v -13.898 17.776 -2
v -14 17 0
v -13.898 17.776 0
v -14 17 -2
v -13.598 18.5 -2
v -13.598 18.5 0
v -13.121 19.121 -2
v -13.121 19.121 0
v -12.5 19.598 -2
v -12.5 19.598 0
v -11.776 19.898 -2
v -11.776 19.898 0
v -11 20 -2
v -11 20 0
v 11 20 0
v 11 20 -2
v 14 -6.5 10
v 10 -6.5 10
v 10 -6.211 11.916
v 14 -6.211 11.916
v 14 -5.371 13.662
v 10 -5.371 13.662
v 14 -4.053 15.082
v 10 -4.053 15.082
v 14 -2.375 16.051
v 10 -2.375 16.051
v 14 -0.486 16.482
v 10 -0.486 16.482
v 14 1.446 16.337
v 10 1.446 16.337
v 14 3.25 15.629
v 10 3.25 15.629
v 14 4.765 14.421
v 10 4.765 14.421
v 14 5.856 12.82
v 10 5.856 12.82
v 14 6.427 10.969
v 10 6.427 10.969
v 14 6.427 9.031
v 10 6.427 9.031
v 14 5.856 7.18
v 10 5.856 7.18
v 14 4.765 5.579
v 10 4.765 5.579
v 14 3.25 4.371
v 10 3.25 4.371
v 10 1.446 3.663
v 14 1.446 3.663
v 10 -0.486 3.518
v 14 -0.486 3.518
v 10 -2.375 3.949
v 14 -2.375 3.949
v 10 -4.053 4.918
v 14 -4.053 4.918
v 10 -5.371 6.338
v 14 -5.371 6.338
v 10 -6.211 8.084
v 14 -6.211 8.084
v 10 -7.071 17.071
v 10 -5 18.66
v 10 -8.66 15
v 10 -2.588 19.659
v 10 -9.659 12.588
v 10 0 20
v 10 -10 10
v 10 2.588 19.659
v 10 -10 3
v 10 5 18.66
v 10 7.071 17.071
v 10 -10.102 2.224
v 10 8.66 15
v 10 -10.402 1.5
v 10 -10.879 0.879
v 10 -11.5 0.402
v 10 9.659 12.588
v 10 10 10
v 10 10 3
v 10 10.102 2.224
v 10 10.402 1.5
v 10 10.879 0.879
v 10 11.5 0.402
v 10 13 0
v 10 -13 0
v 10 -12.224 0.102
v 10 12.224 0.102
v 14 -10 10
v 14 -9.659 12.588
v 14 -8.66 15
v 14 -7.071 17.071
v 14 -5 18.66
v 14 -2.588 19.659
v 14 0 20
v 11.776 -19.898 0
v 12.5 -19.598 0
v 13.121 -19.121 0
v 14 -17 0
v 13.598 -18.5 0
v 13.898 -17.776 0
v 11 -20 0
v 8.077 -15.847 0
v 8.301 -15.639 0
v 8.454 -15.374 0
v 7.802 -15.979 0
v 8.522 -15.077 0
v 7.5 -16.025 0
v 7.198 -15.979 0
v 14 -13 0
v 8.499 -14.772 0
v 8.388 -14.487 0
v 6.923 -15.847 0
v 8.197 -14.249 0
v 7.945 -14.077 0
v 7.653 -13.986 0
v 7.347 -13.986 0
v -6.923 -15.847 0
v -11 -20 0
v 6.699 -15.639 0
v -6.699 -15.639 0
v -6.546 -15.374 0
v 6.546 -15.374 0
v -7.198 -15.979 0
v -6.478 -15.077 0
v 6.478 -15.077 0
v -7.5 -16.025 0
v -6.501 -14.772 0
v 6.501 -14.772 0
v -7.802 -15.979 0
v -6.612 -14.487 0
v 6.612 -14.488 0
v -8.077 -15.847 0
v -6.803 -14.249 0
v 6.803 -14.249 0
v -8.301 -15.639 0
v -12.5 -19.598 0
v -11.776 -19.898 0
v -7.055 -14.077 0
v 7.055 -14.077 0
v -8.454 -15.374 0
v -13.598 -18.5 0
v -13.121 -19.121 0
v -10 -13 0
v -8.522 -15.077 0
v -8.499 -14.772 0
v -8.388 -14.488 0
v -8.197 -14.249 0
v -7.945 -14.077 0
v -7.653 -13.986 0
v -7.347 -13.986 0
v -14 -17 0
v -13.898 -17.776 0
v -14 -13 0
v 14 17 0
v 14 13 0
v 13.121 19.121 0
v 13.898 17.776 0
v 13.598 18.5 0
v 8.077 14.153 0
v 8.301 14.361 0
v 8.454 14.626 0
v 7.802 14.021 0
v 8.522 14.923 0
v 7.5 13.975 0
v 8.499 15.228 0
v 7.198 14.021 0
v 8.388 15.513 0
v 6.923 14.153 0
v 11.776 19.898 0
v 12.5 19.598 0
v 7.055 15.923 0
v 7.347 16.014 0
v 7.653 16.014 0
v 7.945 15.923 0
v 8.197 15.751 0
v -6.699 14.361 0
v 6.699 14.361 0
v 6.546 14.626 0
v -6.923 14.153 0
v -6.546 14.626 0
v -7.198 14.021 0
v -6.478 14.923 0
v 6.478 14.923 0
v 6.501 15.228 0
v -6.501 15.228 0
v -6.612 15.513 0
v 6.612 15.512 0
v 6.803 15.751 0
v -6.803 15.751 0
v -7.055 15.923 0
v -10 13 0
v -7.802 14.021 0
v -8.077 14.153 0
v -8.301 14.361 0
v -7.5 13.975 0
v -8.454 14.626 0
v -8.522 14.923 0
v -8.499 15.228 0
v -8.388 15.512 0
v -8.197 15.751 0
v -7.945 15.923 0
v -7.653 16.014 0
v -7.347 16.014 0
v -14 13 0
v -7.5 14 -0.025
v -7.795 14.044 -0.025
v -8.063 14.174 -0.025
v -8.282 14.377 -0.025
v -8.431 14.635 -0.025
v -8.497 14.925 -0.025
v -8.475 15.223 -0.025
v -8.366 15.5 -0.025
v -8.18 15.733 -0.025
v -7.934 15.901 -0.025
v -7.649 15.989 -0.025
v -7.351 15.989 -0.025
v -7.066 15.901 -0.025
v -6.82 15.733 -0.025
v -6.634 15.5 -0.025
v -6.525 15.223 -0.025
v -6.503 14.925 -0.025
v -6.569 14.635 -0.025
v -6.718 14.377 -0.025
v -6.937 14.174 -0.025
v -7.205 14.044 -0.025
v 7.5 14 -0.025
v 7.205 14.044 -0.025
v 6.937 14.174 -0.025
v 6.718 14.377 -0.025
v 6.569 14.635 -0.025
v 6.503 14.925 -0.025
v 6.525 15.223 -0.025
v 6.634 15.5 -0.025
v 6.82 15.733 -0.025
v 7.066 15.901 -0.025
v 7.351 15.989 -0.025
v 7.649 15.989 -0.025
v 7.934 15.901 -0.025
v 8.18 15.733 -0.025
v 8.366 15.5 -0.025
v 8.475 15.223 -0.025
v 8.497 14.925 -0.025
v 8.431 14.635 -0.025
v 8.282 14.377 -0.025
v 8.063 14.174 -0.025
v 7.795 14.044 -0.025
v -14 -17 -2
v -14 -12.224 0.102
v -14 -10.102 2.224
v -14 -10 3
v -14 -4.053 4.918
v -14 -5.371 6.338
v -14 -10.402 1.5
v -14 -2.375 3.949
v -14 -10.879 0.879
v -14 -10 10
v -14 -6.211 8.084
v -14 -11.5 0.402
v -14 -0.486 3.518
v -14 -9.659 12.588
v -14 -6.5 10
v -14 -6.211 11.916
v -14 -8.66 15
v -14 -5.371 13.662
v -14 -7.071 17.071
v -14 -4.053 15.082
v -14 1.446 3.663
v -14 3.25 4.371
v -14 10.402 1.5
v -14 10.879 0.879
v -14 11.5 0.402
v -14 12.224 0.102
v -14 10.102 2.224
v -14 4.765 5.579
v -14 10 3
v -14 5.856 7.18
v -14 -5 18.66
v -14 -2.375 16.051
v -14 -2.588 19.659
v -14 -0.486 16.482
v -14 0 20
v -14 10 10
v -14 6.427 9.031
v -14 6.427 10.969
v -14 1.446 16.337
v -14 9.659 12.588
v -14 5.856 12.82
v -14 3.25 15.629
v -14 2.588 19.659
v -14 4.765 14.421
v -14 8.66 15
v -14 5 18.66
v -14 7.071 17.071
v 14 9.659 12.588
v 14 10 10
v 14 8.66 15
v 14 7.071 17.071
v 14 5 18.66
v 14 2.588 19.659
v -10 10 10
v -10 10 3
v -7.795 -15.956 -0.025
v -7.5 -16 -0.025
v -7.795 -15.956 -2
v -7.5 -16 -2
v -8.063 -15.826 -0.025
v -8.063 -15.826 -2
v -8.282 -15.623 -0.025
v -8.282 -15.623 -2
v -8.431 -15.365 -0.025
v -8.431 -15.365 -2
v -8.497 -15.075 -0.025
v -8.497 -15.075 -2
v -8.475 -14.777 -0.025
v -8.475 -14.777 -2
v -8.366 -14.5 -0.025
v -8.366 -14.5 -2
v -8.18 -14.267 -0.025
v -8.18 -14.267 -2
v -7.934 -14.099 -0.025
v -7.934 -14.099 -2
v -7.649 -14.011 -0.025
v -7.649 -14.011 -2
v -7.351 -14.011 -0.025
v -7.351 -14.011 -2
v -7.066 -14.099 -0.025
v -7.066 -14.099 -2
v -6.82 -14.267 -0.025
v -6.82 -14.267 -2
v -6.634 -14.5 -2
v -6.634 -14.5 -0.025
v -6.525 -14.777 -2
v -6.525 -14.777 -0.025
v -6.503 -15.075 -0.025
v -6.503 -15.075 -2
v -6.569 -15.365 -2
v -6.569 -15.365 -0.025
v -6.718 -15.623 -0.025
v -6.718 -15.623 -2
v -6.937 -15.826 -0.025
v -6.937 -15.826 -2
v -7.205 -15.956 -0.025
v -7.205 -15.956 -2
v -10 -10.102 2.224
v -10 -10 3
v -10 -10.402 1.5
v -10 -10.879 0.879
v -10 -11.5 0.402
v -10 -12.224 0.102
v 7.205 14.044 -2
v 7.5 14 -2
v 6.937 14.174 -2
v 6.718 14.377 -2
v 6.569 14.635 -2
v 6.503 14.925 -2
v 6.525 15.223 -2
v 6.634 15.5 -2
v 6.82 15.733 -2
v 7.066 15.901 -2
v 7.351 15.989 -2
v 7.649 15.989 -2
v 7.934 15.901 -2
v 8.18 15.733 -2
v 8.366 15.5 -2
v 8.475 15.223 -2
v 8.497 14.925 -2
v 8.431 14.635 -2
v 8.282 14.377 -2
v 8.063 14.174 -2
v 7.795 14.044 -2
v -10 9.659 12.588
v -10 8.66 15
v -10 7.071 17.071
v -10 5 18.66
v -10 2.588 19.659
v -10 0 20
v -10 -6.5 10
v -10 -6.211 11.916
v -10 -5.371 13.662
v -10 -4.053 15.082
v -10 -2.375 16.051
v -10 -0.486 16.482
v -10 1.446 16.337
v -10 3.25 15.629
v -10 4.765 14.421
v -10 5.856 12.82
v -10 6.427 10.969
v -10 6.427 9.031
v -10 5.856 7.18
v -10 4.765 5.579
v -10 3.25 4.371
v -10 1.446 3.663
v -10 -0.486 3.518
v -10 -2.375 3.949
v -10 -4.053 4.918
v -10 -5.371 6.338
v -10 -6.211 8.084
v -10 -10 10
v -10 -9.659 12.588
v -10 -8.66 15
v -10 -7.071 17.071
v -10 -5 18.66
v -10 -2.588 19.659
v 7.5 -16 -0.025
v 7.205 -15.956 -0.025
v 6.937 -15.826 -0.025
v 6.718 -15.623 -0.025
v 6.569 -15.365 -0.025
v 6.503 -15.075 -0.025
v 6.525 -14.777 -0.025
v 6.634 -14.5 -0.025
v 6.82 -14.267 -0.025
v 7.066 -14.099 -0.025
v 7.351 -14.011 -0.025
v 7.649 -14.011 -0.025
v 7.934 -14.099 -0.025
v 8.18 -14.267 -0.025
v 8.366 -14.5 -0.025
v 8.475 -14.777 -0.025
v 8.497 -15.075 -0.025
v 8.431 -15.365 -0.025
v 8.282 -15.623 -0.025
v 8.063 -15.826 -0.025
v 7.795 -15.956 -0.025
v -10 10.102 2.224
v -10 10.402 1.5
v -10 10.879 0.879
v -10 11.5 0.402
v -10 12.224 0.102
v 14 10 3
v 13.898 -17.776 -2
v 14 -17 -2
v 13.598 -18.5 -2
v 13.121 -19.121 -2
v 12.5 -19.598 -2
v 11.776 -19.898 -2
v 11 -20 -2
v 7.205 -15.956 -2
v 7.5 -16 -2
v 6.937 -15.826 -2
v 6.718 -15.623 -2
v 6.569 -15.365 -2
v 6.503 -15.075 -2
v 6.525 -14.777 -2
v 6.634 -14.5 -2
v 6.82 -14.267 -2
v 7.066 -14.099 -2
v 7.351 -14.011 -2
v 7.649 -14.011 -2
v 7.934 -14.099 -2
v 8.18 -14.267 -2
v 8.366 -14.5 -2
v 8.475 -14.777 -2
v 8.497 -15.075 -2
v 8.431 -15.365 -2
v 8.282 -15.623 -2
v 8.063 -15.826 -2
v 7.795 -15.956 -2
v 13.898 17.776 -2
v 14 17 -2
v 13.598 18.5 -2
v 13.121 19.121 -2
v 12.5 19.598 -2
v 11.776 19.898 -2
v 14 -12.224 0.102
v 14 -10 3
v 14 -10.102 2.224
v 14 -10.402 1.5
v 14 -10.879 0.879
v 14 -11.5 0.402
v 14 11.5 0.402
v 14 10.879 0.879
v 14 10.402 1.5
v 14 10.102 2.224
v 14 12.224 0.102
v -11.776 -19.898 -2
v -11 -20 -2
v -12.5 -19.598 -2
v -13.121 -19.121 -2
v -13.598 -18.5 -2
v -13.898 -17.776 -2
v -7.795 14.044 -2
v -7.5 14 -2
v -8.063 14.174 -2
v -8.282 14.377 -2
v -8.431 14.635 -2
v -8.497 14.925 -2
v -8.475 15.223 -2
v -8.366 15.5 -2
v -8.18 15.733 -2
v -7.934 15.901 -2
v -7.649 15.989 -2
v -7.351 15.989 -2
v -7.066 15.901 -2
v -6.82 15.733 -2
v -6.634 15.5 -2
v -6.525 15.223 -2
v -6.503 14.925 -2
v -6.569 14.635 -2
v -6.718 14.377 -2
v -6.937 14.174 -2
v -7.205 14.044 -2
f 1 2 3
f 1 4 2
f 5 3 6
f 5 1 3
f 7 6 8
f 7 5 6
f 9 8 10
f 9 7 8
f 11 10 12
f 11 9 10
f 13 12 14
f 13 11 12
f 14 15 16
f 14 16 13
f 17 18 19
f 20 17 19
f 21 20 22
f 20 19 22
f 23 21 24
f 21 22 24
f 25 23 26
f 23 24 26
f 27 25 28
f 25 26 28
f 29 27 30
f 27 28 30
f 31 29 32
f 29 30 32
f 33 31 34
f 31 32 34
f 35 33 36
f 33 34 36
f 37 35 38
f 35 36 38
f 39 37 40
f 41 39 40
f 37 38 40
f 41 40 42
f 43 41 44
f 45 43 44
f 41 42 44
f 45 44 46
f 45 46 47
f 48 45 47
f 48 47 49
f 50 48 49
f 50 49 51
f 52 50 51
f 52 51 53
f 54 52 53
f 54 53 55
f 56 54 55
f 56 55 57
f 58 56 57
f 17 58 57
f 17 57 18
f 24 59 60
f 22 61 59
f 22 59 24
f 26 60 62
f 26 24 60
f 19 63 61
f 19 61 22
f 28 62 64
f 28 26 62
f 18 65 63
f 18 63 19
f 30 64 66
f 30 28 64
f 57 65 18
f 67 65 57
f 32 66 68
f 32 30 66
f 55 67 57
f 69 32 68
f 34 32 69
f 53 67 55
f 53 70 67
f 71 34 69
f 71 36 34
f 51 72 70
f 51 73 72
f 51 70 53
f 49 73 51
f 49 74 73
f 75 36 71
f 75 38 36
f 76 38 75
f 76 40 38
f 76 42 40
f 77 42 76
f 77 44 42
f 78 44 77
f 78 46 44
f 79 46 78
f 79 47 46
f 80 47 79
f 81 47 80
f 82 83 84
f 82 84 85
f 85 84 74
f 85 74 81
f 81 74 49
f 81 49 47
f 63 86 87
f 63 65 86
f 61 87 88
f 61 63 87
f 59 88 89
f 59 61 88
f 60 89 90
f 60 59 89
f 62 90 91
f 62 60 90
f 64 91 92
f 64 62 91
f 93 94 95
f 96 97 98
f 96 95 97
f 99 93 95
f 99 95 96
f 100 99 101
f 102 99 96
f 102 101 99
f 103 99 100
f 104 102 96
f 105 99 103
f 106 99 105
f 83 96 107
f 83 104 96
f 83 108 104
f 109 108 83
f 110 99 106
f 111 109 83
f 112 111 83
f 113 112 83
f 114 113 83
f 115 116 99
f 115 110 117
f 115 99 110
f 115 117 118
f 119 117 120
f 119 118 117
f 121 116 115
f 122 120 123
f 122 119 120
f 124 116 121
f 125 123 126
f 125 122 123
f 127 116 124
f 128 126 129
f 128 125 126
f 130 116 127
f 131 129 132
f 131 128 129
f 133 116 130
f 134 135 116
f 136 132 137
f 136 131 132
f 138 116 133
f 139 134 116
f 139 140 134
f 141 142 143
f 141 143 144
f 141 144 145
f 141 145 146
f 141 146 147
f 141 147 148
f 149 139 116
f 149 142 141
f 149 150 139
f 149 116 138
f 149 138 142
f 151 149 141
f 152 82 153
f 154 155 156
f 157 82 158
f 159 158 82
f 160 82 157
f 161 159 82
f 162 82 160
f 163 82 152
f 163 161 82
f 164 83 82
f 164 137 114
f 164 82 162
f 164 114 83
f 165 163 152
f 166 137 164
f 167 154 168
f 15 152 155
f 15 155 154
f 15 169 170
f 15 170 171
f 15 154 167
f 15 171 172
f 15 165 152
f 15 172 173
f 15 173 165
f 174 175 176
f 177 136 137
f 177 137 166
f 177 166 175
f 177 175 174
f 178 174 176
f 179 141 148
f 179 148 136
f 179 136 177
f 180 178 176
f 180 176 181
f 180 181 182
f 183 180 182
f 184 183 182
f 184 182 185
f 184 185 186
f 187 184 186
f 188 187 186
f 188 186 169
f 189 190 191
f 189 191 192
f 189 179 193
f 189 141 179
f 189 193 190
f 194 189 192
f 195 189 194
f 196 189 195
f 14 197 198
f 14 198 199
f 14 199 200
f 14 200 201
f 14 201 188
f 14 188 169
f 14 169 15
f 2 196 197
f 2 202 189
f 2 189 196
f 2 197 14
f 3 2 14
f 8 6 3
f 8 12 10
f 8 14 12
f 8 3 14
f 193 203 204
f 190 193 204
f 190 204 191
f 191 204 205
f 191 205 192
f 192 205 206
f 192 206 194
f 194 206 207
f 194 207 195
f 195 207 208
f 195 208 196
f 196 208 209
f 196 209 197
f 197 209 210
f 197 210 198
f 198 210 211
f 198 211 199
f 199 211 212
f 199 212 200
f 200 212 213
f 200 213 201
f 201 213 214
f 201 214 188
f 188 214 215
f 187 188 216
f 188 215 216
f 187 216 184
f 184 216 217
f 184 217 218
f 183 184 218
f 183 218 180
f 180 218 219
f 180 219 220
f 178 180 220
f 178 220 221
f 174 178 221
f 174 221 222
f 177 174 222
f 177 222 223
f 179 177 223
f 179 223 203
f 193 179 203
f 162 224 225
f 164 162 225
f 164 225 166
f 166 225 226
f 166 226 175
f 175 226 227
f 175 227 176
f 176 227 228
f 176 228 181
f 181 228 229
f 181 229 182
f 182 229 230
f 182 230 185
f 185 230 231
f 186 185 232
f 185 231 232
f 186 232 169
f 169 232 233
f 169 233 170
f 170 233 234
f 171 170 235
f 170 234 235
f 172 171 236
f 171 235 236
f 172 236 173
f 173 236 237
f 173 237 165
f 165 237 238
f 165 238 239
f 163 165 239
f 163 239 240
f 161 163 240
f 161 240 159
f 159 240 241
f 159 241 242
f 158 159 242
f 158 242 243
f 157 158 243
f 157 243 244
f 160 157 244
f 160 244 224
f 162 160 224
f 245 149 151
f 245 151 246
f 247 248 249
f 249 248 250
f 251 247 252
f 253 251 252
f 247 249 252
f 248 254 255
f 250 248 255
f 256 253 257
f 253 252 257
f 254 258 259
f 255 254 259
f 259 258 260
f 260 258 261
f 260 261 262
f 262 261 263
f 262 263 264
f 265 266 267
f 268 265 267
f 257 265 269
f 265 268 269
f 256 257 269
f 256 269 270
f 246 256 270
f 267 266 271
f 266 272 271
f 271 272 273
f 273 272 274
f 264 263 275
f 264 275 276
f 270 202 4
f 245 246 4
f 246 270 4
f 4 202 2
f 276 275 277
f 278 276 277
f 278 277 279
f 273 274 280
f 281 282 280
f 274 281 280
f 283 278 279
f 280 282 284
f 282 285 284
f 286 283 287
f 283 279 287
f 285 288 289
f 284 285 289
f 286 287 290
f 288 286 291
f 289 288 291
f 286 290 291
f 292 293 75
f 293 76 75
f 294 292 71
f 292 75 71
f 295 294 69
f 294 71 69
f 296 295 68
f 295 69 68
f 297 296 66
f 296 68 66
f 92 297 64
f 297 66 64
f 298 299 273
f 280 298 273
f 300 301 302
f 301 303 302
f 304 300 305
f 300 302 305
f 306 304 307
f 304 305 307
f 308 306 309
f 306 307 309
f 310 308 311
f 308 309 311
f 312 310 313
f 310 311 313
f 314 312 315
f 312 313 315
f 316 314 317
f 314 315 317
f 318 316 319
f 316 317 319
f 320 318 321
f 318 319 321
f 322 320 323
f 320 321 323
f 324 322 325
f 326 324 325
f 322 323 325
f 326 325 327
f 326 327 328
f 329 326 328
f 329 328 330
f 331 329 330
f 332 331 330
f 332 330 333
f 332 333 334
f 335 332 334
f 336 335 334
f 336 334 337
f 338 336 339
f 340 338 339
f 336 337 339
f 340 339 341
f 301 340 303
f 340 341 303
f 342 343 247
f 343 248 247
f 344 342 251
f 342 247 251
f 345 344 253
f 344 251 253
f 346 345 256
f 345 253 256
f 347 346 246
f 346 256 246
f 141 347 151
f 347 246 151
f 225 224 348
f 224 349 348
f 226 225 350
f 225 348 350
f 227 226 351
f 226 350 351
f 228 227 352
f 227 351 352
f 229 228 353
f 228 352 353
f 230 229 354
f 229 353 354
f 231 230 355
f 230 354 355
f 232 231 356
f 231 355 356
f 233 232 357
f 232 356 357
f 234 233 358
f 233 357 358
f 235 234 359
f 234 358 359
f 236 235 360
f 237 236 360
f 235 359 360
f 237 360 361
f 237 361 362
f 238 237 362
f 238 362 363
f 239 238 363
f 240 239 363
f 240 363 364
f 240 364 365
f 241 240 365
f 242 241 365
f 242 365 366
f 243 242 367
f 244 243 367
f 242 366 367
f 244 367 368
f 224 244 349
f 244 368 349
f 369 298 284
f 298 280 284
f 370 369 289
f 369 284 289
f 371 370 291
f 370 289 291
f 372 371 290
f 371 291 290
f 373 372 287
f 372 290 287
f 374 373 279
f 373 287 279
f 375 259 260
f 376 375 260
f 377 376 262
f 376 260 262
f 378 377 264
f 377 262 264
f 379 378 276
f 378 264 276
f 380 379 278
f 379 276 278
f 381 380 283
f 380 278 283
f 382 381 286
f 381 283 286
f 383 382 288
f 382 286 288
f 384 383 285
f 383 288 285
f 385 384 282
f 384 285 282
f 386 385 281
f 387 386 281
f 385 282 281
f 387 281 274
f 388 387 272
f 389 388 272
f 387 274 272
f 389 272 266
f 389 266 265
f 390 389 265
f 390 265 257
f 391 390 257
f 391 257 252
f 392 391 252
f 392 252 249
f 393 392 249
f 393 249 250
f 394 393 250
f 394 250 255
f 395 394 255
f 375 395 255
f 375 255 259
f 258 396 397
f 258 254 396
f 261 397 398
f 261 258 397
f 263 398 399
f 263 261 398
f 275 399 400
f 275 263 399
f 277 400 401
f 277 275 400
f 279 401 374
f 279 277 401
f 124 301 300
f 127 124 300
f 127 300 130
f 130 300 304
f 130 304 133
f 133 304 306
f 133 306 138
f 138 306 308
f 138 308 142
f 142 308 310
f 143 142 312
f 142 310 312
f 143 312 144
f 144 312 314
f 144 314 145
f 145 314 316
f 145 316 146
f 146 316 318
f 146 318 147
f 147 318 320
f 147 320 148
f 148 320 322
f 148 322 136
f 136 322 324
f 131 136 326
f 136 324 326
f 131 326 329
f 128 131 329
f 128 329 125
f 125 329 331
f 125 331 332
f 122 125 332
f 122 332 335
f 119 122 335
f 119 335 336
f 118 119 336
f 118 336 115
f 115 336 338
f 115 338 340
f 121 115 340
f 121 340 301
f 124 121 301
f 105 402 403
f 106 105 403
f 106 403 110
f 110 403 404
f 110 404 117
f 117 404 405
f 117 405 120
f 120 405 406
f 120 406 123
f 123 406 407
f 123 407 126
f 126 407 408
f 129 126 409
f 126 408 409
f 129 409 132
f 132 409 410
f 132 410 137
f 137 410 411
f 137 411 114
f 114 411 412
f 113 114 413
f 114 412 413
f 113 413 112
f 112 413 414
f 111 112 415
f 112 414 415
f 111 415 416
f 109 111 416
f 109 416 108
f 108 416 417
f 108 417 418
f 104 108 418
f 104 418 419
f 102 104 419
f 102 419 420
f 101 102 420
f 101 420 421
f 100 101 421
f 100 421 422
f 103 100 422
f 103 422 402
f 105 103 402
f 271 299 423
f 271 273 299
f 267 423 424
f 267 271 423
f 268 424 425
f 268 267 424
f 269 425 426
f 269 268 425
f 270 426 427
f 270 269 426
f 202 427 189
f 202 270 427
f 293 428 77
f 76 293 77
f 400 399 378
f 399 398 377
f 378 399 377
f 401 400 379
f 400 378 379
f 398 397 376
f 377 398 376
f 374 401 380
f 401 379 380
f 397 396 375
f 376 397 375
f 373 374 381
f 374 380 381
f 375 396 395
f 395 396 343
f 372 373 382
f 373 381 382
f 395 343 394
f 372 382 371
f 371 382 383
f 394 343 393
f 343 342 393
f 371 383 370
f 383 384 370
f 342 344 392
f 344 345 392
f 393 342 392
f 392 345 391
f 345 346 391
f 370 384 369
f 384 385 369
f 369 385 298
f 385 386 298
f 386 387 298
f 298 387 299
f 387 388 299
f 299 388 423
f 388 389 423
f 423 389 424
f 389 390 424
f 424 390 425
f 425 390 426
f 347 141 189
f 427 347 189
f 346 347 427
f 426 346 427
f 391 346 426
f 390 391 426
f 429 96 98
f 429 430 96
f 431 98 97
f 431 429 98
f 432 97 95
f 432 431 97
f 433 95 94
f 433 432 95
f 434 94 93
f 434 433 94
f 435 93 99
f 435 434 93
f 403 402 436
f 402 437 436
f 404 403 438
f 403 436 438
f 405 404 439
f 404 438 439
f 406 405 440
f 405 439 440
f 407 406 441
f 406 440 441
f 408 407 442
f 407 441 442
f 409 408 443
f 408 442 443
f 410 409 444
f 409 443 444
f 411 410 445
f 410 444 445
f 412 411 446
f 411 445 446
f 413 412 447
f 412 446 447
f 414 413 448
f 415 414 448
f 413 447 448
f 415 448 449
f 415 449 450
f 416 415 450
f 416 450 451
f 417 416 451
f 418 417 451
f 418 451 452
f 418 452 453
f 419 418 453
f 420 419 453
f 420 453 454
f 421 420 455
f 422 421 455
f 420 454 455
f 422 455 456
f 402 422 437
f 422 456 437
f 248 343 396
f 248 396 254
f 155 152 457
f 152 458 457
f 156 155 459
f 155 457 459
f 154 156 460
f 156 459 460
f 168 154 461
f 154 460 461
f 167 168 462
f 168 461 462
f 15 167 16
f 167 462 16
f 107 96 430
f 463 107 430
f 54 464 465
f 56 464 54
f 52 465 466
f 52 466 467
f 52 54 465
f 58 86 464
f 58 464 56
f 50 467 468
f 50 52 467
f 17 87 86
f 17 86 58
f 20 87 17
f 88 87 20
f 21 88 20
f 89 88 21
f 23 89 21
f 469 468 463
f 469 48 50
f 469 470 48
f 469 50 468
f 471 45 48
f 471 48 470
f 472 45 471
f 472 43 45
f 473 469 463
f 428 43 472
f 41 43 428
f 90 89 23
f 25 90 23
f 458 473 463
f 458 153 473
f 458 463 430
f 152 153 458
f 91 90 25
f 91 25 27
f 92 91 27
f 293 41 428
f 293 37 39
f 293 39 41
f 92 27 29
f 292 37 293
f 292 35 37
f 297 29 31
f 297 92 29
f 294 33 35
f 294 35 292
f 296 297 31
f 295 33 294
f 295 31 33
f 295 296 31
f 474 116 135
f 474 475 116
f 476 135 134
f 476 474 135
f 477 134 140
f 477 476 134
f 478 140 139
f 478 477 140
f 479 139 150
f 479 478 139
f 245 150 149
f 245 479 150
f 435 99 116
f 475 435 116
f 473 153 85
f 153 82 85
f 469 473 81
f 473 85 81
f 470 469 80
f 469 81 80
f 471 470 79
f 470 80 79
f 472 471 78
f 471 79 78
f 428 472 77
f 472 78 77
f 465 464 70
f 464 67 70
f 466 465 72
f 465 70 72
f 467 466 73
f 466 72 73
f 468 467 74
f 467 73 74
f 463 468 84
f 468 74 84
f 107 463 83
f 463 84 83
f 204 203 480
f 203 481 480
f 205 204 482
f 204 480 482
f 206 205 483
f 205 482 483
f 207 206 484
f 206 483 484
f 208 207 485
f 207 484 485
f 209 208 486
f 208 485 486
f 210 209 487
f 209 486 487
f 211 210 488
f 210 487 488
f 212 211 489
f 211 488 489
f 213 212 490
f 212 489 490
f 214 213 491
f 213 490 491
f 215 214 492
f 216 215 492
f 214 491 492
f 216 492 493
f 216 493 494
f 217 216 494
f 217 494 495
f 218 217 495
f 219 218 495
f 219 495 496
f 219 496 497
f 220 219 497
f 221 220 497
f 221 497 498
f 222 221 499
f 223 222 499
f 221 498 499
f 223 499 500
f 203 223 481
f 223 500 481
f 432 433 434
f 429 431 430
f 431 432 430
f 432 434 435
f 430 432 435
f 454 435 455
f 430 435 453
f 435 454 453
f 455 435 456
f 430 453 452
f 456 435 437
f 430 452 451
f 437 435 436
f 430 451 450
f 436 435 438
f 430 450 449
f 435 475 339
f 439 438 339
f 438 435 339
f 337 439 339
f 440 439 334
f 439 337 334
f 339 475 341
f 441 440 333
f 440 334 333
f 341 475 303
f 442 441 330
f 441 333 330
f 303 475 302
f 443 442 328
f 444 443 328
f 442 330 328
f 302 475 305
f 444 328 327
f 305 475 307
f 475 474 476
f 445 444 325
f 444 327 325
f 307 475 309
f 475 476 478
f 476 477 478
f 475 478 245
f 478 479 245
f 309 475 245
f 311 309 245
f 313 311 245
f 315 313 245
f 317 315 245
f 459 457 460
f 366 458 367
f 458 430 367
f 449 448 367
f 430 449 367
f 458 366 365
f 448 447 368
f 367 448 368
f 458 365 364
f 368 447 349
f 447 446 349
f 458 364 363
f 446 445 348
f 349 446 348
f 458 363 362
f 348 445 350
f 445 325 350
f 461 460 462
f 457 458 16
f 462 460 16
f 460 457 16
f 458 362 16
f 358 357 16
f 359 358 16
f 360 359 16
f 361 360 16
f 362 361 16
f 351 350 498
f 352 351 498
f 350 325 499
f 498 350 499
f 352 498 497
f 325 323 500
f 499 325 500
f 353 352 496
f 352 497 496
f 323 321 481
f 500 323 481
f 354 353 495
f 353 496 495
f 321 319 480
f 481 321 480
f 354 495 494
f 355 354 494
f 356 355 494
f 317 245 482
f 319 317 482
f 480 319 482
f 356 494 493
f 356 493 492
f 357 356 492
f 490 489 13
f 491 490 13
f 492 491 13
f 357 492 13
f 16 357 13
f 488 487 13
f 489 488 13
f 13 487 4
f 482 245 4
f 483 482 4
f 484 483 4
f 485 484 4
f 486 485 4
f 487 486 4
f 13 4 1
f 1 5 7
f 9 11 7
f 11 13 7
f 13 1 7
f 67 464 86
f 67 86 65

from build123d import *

# Parameters (mm, degrees)
SKETCH1_W                       = 40
SKETCH1_H                       = 28
BOSS_EXTRUDE1_DEPTH             = 2
SKETCH2_W                       = 20
SKETCH2_H                       = 4
BOSS_EXTRUDE2_DEPTH             = 20
FILLET1_R                       = 10
F_10_0MM_DOWEL_HOLE1_D          = 13
F_2_0MM_DOWEL_HOLE1_D           = 2
F_2_0MM_DOWEL_HOLE1_CSINK_D     = 2.05
F_2_0MM_DOWEL_HOLE1_CSINK_ANGLE = 90
FILLET2_R                       = 3


with BuildPart() as part:
    # Sketch1 → Boss-Extrude1 (new body)
    with BuildSketch(Plane(origin=(0, 0, 0), x_dir=(0, 1, 0), z_dir=(0, 0, 1))):
        Rectangle(SKETCH1_W, SKETCH1_H)
    extrude(amount=-BOSS_EXTRUDE1_DEPTH)

    # Sketch2 → Boss-Extrude2 (add)
    with BuildSketch(Plane(origin=(0, 0, 0), x_dir=(0, 1, 0), z_dir=(0, 0, 1))):
        with Locations((0, 12)):
            Rectangle(SKETCH2_W, SKETCH2_H)
        with Locations((0, -12)):
            Rectangle(SKETCH2_W, SKETCH2_H)
    extrude(amount=BOSS_EXTRUDE2_DEPTH)

    # Fillet1
    fillet1_edges = [part.edges().sort_by_distance(p)[0] for p in [
        (12, 10, 20),
        (12, -10, 20),
        (-12, 10, 20),
        (-12, -10, 20),
    ]]
    fillet(fillet1_edges, radius=FILLET1_R - 0.0001)  # a hair under: the kernel refuses the full size

    # Ø10.0mm Dowel Hole1 (through all)
    with Locations(Plane.YZ.offset(14)):
        with Locations((0, 10)):
            Hole(F_10_0MM_DOWEL_HOLE1_D / 2)

    # Ø2.0mm Dowel Hole1 (through all)
    with Locations(Plane(origin=(0, 0, 0), x_dir=(0, 1, 0), z_dir=(0, 0, 1))):
        with Locations((15, -7.5), (-15, 7.5), (-15, -7.5), (15, 7.5)):
            CounterSinkHole(F_2_0MM_DOWEL_HOLE1_D / 2, F_2_0MM_DOWEL_HOLE1_CSINK_D / 2, counter_sink_angle=F_2_0MM_DOWEL_HOLE1_CSINK_ANGLE)

    # Fillet2
    fillet2_edges = [part.edges().sort_by_distance(p)[0] for p in [
        (-12, -10, 0),
        (-12, 10, 0),
        (12, -10, 0),
        (12, 10, 0),
        (-14, -20, -1),
        (-14, 20, -1),
        (14, 20, -1),
        (14, -20, -1),
    ]]
    fillet(fillet2_edges, radius=FILLET2_R)


solid = part.part
